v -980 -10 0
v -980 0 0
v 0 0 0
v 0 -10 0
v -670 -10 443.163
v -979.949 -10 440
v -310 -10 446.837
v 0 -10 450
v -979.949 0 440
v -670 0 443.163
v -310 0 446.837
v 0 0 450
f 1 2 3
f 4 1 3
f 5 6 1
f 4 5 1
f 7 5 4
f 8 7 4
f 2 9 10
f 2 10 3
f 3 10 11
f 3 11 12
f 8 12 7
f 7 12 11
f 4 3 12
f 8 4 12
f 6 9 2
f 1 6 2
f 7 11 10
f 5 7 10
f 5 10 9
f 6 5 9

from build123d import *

# Parameters (mm, degrees)
F1_DEPTH = 10


with BuildPart() as f1:
    # F0 (on Front) → F1 (new body)
    with BuildSketch(Plane.XZ):
        Polygon((-979.948978, 439.999997), (-980, 0), (-670, 0), (-670, 443.162907), align=None)
        Polygon((-670, 443.162907), (-670, 0), (-310, 0), (-310, 446.836569), align=None)
        Polygon((-310, 446.836569), (-310, 0), (0, 0), (0, 450), align=None)
    extrude(amount=F1_DEPTH)


solid = f1.part
